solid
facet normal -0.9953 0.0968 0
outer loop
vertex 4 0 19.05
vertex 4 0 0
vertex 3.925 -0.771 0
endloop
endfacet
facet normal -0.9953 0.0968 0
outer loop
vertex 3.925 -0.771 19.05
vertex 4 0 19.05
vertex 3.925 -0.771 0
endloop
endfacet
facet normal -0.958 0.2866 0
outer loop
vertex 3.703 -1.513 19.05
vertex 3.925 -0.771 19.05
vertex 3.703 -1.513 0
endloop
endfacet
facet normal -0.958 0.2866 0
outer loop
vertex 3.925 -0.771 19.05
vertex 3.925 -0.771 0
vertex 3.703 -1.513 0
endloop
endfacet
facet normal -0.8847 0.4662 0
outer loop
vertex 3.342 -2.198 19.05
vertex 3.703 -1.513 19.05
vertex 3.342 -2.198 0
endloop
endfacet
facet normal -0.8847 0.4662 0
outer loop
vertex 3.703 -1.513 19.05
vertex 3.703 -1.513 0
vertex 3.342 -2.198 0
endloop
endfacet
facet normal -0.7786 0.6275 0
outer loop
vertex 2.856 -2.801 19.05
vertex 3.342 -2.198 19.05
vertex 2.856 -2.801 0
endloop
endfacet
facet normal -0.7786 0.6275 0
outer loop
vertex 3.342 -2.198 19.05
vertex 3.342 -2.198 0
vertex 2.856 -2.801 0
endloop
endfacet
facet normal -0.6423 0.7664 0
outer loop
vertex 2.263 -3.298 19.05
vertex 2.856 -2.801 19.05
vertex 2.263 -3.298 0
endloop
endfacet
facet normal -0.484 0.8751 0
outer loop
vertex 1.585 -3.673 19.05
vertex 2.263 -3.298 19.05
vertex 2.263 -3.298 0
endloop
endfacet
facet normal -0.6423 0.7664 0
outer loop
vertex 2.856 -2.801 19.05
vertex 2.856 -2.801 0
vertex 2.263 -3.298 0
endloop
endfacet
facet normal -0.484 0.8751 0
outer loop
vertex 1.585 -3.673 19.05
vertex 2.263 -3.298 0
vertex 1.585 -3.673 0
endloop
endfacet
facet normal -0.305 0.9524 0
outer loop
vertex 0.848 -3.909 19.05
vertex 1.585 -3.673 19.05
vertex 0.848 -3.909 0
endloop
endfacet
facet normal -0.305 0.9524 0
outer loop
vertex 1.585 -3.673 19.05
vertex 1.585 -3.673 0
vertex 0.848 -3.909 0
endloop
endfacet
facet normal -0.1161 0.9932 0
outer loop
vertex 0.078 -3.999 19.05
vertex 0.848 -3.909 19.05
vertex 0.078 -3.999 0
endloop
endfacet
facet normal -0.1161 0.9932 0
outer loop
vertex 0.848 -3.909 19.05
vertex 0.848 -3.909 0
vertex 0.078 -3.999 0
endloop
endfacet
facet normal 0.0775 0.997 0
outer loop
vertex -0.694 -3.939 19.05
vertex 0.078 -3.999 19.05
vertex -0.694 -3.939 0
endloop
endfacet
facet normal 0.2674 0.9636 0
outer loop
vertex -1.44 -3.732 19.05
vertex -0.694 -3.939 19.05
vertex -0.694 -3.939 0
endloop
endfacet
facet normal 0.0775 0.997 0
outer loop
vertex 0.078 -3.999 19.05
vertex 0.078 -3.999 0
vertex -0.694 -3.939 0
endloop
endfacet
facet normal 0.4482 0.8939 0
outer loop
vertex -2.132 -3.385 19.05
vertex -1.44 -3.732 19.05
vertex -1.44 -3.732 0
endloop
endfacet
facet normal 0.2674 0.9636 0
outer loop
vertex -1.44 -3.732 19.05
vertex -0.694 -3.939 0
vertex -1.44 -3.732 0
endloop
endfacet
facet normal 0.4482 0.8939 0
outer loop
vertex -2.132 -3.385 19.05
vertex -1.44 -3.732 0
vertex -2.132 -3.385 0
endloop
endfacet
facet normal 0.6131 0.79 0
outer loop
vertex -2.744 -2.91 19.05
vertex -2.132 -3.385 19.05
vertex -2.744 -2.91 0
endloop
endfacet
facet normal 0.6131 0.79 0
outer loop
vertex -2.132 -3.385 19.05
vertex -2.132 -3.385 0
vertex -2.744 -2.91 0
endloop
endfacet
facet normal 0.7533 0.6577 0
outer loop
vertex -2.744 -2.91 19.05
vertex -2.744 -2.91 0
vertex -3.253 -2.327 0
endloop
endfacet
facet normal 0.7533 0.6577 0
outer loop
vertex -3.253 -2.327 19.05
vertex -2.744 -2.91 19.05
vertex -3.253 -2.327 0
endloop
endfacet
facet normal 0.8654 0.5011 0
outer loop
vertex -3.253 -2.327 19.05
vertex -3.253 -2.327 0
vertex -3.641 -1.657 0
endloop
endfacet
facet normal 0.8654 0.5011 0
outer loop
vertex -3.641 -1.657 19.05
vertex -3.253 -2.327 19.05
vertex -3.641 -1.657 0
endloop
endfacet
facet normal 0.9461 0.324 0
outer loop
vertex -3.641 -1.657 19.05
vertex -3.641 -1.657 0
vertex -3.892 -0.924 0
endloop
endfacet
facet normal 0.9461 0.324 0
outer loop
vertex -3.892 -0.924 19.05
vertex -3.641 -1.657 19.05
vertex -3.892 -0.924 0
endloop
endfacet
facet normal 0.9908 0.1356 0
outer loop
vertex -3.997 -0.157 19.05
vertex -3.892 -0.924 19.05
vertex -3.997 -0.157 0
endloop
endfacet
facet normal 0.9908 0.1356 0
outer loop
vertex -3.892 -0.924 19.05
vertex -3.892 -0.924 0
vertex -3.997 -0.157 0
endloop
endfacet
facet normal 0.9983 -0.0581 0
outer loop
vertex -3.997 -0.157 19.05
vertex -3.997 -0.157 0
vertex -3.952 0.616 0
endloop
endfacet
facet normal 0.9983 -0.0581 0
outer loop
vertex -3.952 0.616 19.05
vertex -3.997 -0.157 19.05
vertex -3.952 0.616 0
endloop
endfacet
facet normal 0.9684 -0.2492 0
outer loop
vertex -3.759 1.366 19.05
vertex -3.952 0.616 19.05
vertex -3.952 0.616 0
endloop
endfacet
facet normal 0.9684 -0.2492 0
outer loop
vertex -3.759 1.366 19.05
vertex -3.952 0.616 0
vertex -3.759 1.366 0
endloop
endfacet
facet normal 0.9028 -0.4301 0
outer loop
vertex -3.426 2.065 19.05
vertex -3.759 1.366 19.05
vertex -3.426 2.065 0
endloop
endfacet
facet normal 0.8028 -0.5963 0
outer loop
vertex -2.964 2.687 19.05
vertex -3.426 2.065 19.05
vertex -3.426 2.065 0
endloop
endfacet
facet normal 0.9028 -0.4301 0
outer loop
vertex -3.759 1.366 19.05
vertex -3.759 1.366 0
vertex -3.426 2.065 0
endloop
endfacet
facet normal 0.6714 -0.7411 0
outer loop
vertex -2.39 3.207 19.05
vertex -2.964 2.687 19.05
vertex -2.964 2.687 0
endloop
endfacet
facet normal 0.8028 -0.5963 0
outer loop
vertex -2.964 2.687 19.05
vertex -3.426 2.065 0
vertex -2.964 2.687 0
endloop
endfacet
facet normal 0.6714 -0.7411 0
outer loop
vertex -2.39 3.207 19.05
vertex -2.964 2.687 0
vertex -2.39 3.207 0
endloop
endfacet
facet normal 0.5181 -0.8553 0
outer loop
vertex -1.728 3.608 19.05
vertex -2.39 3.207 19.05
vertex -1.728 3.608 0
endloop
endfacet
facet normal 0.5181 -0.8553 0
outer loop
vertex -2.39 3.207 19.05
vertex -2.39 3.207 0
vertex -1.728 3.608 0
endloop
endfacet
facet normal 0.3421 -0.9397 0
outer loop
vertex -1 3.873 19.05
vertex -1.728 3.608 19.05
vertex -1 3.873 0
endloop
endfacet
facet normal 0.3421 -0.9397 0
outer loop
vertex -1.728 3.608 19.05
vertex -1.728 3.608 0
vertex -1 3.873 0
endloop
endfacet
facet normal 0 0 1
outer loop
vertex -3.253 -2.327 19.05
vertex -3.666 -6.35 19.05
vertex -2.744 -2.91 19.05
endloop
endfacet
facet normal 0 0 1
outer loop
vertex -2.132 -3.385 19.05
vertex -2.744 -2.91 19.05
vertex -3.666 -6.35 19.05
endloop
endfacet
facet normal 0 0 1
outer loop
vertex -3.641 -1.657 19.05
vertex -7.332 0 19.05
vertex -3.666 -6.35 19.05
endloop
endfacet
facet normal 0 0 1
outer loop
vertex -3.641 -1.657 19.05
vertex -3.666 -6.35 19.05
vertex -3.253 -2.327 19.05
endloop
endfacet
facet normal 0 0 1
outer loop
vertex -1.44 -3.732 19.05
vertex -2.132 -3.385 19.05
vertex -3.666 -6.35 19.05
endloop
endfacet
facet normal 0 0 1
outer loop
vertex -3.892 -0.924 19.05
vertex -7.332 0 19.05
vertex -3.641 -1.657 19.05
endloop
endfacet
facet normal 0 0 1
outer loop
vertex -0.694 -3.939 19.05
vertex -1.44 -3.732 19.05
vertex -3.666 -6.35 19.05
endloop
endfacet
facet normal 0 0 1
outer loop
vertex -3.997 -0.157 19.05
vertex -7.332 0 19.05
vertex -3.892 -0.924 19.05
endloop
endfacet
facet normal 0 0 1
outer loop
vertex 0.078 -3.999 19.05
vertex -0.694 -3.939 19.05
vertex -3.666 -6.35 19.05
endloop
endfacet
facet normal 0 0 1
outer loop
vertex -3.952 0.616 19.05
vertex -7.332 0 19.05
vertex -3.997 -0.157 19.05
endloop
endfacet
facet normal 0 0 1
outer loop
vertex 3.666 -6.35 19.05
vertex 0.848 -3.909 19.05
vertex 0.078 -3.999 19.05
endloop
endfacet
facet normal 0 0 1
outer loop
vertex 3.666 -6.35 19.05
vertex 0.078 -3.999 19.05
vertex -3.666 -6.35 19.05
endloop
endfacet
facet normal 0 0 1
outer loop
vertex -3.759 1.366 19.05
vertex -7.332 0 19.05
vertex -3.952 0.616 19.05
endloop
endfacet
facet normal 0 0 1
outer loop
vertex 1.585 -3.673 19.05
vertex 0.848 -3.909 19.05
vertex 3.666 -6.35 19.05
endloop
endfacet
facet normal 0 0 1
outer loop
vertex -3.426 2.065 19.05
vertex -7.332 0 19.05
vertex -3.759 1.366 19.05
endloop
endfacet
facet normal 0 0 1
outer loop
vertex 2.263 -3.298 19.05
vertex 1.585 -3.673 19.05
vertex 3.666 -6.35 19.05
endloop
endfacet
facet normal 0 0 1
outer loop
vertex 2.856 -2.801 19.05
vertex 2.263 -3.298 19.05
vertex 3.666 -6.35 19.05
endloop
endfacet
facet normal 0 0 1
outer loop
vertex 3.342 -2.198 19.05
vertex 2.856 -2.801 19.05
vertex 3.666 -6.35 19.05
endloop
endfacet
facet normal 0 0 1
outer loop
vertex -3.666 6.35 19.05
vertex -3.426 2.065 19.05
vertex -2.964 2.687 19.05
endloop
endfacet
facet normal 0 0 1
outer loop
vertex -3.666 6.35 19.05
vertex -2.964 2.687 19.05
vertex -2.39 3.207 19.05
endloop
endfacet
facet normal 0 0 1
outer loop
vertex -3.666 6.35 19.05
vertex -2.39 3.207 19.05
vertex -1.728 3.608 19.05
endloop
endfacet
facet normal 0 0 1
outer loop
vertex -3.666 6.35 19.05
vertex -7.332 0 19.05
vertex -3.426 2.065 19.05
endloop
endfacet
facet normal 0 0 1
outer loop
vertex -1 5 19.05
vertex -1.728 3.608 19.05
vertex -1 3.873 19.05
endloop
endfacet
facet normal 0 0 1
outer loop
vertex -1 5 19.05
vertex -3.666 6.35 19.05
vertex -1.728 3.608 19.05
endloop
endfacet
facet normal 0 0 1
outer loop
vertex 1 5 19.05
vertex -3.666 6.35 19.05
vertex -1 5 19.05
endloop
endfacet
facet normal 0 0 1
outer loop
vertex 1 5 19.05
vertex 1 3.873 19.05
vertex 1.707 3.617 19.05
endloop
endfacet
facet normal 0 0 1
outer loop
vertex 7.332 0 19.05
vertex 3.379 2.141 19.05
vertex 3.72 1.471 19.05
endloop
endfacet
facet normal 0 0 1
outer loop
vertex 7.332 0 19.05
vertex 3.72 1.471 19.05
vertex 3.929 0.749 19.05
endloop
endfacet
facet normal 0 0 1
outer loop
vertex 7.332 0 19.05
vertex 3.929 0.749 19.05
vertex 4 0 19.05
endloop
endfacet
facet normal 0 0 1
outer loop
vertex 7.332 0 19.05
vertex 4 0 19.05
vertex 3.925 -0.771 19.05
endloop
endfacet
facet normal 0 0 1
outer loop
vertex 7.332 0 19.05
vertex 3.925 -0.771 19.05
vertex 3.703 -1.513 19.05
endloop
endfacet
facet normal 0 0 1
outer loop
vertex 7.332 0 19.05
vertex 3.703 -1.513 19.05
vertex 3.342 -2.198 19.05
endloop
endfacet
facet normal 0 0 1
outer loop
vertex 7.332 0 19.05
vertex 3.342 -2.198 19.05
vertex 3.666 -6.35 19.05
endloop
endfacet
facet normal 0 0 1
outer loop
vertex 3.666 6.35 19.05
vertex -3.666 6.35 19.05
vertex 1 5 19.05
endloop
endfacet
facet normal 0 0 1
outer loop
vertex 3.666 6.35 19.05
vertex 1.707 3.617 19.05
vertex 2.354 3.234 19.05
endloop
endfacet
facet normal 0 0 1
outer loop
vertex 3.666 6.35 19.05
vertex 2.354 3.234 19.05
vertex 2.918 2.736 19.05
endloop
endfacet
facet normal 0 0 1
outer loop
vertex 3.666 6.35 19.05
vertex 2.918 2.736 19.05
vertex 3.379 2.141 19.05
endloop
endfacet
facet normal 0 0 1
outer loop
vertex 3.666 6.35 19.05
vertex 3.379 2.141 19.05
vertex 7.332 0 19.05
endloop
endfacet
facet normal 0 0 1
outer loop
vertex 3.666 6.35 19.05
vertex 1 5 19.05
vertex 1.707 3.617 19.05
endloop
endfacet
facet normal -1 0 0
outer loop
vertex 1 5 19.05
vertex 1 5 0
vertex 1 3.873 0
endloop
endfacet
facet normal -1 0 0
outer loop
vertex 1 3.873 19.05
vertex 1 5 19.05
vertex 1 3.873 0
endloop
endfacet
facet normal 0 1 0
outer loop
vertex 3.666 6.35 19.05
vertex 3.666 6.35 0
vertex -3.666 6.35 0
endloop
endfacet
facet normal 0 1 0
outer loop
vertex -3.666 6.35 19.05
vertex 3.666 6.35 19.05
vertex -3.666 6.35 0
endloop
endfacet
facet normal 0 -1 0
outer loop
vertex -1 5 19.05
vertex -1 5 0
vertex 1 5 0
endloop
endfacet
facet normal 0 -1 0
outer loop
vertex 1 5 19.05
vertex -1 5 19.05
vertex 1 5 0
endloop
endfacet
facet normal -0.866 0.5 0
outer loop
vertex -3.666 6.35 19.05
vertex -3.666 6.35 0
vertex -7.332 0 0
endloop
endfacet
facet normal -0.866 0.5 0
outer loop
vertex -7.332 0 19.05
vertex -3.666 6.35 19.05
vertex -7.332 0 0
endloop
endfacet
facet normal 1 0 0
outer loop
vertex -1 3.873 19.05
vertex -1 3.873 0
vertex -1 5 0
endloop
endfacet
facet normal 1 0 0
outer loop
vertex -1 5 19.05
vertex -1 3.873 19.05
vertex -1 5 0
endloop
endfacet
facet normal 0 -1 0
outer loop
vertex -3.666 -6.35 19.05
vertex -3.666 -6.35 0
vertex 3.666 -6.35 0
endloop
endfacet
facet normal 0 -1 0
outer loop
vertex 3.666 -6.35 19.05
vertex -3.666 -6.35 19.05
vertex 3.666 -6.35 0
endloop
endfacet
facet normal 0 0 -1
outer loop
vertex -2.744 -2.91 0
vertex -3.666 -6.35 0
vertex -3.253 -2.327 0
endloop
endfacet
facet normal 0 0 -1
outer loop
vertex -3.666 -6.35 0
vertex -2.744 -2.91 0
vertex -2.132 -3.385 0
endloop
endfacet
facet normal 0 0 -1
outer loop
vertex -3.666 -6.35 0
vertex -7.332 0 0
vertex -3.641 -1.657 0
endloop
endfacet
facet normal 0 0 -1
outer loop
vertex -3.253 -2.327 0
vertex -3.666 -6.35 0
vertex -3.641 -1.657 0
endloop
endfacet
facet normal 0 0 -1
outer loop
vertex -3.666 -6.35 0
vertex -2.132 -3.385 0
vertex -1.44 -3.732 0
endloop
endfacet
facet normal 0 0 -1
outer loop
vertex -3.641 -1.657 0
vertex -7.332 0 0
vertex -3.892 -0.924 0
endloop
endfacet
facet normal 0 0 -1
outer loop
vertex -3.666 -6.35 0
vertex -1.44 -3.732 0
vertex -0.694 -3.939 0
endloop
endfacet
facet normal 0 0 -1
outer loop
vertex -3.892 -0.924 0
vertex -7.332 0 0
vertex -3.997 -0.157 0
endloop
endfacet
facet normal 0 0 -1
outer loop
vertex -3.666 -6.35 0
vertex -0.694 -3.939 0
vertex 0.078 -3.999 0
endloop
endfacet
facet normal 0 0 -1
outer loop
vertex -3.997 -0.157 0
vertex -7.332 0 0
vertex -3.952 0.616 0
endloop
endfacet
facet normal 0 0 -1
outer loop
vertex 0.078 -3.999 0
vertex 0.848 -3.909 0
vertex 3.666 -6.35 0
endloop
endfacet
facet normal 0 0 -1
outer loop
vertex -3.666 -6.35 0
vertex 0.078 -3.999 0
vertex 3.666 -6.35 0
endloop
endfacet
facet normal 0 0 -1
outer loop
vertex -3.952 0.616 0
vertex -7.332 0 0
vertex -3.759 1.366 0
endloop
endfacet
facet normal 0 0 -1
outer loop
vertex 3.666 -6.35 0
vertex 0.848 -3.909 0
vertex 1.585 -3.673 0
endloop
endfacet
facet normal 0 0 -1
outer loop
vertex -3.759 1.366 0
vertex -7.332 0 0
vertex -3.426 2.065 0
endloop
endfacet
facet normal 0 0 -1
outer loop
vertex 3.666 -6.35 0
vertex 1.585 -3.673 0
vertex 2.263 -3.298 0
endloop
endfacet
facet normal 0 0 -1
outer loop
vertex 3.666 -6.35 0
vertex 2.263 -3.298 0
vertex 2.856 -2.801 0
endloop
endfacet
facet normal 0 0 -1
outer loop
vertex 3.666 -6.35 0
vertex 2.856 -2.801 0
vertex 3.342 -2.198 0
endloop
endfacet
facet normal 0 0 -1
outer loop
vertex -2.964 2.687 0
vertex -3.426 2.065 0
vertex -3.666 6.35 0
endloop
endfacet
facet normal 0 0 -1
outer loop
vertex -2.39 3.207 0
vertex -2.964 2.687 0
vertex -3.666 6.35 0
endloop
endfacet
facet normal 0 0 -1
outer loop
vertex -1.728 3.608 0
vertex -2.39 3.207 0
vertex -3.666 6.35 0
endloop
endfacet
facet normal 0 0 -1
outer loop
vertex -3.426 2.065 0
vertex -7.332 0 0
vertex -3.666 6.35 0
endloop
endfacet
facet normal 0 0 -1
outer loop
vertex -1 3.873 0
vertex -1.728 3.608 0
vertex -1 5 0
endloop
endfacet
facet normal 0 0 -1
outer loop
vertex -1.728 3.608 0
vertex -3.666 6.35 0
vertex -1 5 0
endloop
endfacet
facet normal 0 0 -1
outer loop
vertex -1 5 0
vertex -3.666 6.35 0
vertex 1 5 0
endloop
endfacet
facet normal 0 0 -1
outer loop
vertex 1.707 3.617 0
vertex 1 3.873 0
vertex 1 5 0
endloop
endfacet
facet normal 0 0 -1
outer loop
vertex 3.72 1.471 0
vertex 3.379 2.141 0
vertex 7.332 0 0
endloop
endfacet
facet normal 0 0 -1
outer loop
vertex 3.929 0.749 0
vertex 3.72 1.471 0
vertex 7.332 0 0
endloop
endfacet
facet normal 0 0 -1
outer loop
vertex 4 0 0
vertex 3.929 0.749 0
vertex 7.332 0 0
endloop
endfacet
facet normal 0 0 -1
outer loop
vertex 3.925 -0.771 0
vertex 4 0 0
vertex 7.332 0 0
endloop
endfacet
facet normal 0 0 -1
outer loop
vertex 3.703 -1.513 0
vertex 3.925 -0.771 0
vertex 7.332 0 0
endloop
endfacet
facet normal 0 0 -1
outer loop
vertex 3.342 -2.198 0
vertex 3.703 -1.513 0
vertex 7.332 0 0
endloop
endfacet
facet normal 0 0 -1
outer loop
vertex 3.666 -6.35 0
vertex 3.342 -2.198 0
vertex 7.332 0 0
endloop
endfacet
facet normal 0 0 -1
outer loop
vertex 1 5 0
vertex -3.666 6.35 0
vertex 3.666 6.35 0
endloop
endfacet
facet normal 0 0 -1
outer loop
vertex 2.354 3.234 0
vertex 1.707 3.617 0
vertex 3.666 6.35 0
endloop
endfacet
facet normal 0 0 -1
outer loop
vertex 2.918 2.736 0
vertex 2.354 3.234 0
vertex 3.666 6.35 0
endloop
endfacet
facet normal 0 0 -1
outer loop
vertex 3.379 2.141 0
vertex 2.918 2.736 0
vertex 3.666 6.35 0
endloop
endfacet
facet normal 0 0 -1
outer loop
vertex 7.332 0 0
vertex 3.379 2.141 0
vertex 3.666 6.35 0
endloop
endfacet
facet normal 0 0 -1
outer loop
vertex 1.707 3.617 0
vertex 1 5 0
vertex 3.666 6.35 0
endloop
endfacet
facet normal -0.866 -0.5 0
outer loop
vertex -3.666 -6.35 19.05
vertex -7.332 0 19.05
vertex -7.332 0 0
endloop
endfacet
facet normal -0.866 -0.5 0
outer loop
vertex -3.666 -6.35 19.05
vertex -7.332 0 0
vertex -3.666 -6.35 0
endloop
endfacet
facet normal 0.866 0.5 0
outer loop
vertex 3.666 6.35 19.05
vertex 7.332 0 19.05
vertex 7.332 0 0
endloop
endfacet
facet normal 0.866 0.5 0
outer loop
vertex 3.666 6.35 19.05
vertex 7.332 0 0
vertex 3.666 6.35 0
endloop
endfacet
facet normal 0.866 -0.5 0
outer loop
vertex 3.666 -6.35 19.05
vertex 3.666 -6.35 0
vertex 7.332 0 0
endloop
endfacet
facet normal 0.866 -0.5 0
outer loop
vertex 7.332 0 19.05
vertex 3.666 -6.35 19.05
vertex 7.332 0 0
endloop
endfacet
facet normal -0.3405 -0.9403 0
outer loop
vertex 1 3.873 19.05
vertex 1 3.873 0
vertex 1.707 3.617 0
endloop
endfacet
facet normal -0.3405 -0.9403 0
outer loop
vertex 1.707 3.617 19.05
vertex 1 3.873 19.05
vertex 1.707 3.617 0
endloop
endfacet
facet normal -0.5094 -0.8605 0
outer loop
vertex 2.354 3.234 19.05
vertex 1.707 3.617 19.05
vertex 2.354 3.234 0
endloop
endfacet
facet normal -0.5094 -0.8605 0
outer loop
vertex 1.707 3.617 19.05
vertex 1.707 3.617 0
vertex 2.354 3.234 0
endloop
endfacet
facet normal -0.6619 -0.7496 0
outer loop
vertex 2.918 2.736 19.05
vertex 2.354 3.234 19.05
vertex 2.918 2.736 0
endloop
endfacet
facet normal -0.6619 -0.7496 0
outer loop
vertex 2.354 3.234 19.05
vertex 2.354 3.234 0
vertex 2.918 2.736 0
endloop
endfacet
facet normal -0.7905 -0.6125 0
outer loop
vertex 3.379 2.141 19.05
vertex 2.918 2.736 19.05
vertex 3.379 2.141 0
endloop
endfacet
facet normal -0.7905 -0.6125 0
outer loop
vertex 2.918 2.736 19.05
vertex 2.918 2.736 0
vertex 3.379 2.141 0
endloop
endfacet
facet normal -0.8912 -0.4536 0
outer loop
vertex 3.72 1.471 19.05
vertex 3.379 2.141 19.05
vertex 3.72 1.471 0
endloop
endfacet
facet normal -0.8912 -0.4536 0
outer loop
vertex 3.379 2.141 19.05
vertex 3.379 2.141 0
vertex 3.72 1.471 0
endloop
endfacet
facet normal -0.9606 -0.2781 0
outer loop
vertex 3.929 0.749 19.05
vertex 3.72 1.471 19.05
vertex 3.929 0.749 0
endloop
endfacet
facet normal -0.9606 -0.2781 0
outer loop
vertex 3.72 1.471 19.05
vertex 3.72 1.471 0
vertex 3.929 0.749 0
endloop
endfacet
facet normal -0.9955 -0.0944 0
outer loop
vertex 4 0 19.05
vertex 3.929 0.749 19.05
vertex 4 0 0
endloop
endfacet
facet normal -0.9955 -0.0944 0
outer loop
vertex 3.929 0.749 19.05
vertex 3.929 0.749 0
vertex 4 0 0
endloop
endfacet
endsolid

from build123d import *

# Parameters (mm, degrees)
BOSS_EXTRUDE1_DEPTH = 19.05


with BuildPart() as part:
    # Sketch1 → Boss-Extrude1 (new body)
    with BuildSketch(Plane.XY):
        Polygon((3.666174209, -6.35), (7.332348419, 0), (3.666174209, 6.35), (-3.666174209, 6.35), (-7.332348419, 0), (-3.666174209, -6.35), align=None)
        with BuildLine():
            Line((1, 5), (1, 3.872983346))
            ThreePointArc((1, 3.872983346), (3.16227766, 2.449489743), (4, 0))
            ThreePointArc((4, 0), (-2.449489743, -3.16227766), (-1, 3.872983346))
            Line((-1, 3.872983346), (-1, 5))
            Line((-1, 5), (1, 5))
        make_face(mode=Mode.SUBTRACT)
    extrude(amount=BOSS_EXTRUDE1_DEPTH)


solid = part.part
